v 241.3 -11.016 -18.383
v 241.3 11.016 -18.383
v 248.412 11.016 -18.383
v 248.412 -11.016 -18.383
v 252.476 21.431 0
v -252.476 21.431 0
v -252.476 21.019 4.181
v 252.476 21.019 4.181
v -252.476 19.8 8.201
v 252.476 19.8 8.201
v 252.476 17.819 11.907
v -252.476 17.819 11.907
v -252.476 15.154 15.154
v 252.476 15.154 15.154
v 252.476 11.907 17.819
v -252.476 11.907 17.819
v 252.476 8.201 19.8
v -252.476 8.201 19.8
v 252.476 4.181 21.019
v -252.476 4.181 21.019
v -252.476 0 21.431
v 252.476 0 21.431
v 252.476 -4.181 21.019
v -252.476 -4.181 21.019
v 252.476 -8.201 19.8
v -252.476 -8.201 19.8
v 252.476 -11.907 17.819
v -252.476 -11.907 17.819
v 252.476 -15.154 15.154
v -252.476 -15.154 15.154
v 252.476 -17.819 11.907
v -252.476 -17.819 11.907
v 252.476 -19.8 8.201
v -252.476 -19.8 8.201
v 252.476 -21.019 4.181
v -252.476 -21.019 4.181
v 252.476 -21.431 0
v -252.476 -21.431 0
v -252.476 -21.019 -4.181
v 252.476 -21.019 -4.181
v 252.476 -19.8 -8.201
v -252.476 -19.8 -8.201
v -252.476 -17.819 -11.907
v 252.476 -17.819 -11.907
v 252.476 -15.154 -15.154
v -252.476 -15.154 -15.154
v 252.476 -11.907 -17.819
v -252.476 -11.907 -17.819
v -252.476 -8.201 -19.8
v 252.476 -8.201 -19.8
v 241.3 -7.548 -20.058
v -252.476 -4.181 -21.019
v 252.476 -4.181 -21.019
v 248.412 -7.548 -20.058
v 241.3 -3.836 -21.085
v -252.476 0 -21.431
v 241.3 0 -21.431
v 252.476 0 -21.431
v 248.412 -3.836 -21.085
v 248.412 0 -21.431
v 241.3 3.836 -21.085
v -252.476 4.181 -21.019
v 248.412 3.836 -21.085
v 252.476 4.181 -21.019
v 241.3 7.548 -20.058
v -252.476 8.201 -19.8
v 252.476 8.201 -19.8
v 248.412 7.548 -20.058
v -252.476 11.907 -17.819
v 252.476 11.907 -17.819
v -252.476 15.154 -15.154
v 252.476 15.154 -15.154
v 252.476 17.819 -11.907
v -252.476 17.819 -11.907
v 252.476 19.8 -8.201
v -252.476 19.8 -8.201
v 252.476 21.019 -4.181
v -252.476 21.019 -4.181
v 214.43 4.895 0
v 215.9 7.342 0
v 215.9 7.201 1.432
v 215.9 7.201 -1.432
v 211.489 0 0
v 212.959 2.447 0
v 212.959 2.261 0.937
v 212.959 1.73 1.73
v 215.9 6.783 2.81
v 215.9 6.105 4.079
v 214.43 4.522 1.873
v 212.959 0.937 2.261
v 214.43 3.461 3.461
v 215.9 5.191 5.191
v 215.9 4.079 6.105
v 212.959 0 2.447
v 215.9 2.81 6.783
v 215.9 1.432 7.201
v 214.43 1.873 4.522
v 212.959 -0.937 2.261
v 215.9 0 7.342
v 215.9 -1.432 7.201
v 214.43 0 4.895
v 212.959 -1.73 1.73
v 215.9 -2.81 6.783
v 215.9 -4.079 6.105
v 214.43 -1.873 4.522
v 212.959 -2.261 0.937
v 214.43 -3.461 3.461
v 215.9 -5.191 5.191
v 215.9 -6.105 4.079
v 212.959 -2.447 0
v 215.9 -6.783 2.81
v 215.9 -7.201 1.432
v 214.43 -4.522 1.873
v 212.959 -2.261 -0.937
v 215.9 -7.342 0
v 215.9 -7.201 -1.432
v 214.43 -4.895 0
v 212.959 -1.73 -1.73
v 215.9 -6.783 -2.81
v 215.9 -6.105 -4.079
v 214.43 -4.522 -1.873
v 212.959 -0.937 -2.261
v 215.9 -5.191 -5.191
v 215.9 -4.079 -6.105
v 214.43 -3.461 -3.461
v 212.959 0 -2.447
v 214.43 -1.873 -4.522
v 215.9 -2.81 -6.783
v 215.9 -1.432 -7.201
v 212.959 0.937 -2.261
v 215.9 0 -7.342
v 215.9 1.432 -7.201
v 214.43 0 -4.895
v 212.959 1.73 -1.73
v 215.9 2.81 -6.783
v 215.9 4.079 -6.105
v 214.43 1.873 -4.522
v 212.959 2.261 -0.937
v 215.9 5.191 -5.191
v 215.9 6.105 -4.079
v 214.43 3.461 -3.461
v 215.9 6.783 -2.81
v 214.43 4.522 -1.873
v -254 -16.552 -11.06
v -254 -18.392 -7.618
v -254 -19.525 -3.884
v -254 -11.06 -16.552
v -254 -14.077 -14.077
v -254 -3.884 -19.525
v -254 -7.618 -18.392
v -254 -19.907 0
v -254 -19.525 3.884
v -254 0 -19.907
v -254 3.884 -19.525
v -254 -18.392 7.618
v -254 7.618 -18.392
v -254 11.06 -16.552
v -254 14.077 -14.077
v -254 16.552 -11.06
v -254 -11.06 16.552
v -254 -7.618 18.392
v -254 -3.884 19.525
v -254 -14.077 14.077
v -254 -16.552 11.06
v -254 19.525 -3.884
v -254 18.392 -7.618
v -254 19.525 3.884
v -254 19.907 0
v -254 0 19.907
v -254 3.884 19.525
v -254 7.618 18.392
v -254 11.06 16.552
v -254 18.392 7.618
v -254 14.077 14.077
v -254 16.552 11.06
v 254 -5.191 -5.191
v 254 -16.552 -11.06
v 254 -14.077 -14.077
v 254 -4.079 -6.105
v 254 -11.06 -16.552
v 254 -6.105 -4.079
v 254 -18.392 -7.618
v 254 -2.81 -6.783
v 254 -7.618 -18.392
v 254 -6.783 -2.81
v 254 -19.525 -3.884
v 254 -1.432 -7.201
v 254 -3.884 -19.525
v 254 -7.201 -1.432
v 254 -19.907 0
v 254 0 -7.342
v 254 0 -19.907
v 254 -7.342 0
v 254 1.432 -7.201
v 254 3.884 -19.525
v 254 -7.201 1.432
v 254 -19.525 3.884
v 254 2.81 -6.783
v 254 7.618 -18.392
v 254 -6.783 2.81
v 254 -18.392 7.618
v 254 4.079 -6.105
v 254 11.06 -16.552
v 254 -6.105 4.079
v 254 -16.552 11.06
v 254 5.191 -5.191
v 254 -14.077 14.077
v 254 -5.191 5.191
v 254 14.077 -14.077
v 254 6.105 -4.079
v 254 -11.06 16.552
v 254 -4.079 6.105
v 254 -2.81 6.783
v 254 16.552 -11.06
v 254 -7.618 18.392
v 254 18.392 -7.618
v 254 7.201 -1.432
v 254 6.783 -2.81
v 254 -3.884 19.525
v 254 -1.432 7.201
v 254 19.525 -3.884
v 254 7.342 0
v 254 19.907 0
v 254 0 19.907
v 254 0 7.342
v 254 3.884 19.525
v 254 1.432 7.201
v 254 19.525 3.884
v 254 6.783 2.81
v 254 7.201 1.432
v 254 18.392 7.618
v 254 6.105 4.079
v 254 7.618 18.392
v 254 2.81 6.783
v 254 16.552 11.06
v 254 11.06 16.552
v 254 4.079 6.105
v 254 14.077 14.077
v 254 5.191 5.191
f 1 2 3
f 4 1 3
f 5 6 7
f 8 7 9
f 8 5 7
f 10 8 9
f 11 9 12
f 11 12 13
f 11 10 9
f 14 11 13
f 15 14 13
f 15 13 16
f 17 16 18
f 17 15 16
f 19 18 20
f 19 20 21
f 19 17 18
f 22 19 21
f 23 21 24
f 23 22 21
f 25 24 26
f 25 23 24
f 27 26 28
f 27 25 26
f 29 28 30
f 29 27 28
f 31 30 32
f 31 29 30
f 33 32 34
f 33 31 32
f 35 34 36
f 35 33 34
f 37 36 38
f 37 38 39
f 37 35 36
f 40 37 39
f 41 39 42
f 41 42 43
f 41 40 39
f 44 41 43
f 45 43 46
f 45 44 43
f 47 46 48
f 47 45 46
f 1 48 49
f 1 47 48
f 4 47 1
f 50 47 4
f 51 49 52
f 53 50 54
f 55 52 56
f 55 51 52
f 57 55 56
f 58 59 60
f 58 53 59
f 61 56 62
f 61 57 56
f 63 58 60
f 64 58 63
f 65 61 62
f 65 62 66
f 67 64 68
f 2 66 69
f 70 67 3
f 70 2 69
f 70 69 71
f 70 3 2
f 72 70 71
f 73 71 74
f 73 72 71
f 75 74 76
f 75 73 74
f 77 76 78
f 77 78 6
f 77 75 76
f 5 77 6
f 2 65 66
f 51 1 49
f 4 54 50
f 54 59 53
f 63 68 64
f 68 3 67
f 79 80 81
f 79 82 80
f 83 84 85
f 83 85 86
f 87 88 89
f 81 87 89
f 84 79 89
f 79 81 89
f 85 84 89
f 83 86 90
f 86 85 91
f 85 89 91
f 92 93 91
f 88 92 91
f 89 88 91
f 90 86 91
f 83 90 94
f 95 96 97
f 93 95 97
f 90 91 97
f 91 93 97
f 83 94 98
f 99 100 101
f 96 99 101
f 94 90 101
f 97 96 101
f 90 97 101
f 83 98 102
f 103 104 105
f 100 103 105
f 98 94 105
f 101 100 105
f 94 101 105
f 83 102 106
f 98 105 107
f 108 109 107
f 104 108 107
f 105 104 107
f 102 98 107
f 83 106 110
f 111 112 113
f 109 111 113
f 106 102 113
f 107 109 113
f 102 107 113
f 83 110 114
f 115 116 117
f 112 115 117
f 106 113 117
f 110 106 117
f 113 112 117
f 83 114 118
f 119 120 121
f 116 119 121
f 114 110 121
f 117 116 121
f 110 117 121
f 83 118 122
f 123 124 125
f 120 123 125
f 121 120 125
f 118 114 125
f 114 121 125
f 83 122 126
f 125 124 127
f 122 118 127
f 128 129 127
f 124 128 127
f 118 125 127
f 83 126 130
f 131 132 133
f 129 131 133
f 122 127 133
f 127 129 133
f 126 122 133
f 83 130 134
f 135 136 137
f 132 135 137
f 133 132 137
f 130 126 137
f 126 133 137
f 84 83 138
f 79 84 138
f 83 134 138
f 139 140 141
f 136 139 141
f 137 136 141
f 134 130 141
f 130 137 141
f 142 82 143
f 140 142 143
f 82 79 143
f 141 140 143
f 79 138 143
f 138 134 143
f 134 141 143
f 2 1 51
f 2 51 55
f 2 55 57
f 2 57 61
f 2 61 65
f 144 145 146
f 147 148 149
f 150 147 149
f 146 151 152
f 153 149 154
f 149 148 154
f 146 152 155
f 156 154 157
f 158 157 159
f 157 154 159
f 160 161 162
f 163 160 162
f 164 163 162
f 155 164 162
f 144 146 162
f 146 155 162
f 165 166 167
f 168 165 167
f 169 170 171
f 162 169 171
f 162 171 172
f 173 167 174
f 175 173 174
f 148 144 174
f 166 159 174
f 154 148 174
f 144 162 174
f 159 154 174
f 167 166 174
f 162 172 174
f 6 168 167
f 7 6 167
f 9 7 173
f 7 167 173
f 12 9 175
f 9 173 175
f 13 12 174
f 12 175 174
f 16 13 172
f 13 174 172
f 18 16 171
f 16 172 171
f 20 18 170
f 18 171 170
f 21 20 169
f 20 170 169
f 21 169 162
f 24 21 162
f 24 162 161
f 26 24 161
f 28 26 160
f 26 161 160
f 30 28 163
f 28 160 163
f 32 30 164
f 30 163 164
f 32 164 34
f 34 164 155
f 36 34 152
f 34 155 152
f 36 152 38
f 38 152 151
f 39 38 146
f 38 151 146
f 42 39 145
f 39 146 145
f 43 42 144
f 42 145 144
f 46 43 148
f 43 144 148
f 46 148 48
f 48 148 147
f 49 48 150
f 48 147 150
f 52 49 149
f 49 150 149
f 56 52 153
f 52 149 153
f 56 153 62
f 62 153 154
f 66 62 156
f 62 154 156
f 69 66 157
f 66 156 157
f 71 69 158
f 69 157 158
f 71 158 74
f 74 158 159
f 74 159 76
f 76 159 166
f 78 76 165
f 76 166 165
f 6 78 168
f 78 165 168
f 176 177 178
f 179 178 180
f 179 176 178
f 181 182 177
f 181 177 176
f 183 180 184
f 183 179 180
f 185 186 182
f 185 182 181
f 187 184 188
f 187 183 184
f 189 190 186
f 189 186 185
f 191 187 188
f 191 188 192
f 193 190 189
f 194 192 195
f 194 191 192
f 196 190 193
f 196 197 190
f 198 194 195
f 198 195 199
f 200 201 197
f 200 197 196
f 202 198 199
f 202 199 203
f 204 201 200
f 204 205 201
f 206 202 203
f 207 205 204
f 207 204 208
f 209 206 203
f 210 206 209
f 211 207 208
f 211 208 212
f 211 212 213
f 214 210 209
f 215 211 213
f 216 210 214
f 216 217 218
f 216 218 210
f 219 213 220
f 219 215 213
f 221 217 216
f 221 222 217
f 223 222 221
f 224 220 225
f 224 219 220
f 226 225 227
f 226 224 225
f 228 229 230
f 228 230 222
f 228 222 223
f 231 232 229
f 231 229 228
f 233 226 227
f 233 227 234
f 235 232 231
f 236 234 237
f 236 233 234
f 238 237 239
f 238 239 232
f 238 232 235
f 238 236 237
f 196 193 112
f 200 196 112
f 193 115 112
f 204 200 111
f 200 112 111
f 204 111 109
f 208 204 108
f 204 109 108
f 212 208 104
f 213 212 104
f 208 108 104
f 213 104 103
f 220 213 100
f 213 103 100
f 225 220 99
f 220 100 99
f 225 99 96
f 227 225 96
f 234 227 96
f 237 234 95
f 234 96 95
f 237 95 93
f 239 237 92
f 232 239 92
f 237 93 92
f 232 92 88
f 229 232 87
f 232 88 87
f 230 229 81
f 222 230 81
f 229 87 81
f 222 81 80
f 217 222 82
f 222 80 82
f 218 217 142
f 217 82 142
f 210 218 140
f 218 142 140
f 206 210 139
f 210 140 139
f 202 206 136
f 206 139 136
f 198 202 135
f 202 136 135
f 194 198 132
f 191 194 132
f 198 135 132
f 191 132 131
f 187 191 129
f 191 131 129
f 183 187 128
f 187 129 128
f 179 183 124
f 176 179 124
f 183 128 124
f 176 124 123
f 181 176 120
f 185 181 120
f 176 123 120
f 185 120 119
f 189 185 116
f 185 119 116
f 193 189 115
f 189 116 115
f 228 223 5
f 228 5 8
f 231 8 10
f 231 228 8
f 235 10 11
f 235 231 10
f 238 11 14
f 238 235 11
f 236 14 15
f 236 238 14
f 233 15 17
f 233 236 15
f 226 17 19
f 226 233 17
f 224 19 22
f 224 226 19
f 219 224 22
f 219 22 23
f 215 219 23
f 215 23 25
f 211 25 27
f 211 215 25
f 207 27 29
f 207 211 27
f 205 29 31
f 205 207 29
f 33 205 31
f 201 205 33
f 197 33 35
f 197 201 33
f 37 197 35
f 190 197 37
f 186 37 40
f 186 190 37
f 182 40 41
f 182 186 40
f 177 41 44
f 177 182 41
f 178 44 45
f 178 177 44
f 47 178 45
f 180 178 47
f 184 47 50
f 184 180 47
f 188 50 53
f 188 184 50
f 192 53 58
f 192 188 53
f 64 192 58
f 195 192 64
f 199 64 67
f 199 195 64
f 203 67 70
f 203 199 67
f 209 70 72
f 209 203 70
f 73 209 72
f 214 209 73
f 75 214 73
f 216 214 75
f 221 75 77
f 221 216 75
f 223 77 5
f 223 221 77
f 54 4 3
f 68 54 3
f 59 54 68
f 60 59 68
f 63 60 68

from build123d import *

# Parameters (mm, degrees)
F0_R     = 21.43125
F1_DEPTH = 254
F2_SIZE  = 1.524
F4_D     = 14.68374
F4_DEPTH = 38.1
F4_TIP   = 4.411440553
F6_W     = 7.112
F6_H     = 3.048
F7_DEPTH = 42.8635


with BuildPart() as f1:
    # F0 (on Right) → F1 (new body, symmetric)
    with BuildSketch(Plane.YZ):
        Circle(F0_R)
    extrude(amount=F1_DEPTH, both=True)

    # F2
    f2_edges = [f1.edges().sort_by_distance(p)[0] for p in [
        (254, -21.43125, 0),
        (-254, -21.43125, 0),
    ]]
    chamfer(f2_edges, length=F2_SIZE)

    # F4
    with Locations(Plane.YZ.offset(254)):
        with Locations((0, 0)):
            Hole(F4_D / 2, depth=F4_DEPTH)
            with Locations((0, 0, -(F4_DEPTH + F4_TIP / 2))):  # 118° drill point
                Cone(0, F4_D / 2, F4_TIP, mode=Mode.SUBTRACT)

    # F6 (on offset) → F7 (cut, through all)
    with BuildSketch(Plane.XZ.offset(21.43125)):
        with Locations((244.856, -19.90725)):
            Rectangle(F6_W, F6_H)
    extrude(amount=-F7_DEPTH, mode=Mode.SUBTRACT)


solid = f1.part
